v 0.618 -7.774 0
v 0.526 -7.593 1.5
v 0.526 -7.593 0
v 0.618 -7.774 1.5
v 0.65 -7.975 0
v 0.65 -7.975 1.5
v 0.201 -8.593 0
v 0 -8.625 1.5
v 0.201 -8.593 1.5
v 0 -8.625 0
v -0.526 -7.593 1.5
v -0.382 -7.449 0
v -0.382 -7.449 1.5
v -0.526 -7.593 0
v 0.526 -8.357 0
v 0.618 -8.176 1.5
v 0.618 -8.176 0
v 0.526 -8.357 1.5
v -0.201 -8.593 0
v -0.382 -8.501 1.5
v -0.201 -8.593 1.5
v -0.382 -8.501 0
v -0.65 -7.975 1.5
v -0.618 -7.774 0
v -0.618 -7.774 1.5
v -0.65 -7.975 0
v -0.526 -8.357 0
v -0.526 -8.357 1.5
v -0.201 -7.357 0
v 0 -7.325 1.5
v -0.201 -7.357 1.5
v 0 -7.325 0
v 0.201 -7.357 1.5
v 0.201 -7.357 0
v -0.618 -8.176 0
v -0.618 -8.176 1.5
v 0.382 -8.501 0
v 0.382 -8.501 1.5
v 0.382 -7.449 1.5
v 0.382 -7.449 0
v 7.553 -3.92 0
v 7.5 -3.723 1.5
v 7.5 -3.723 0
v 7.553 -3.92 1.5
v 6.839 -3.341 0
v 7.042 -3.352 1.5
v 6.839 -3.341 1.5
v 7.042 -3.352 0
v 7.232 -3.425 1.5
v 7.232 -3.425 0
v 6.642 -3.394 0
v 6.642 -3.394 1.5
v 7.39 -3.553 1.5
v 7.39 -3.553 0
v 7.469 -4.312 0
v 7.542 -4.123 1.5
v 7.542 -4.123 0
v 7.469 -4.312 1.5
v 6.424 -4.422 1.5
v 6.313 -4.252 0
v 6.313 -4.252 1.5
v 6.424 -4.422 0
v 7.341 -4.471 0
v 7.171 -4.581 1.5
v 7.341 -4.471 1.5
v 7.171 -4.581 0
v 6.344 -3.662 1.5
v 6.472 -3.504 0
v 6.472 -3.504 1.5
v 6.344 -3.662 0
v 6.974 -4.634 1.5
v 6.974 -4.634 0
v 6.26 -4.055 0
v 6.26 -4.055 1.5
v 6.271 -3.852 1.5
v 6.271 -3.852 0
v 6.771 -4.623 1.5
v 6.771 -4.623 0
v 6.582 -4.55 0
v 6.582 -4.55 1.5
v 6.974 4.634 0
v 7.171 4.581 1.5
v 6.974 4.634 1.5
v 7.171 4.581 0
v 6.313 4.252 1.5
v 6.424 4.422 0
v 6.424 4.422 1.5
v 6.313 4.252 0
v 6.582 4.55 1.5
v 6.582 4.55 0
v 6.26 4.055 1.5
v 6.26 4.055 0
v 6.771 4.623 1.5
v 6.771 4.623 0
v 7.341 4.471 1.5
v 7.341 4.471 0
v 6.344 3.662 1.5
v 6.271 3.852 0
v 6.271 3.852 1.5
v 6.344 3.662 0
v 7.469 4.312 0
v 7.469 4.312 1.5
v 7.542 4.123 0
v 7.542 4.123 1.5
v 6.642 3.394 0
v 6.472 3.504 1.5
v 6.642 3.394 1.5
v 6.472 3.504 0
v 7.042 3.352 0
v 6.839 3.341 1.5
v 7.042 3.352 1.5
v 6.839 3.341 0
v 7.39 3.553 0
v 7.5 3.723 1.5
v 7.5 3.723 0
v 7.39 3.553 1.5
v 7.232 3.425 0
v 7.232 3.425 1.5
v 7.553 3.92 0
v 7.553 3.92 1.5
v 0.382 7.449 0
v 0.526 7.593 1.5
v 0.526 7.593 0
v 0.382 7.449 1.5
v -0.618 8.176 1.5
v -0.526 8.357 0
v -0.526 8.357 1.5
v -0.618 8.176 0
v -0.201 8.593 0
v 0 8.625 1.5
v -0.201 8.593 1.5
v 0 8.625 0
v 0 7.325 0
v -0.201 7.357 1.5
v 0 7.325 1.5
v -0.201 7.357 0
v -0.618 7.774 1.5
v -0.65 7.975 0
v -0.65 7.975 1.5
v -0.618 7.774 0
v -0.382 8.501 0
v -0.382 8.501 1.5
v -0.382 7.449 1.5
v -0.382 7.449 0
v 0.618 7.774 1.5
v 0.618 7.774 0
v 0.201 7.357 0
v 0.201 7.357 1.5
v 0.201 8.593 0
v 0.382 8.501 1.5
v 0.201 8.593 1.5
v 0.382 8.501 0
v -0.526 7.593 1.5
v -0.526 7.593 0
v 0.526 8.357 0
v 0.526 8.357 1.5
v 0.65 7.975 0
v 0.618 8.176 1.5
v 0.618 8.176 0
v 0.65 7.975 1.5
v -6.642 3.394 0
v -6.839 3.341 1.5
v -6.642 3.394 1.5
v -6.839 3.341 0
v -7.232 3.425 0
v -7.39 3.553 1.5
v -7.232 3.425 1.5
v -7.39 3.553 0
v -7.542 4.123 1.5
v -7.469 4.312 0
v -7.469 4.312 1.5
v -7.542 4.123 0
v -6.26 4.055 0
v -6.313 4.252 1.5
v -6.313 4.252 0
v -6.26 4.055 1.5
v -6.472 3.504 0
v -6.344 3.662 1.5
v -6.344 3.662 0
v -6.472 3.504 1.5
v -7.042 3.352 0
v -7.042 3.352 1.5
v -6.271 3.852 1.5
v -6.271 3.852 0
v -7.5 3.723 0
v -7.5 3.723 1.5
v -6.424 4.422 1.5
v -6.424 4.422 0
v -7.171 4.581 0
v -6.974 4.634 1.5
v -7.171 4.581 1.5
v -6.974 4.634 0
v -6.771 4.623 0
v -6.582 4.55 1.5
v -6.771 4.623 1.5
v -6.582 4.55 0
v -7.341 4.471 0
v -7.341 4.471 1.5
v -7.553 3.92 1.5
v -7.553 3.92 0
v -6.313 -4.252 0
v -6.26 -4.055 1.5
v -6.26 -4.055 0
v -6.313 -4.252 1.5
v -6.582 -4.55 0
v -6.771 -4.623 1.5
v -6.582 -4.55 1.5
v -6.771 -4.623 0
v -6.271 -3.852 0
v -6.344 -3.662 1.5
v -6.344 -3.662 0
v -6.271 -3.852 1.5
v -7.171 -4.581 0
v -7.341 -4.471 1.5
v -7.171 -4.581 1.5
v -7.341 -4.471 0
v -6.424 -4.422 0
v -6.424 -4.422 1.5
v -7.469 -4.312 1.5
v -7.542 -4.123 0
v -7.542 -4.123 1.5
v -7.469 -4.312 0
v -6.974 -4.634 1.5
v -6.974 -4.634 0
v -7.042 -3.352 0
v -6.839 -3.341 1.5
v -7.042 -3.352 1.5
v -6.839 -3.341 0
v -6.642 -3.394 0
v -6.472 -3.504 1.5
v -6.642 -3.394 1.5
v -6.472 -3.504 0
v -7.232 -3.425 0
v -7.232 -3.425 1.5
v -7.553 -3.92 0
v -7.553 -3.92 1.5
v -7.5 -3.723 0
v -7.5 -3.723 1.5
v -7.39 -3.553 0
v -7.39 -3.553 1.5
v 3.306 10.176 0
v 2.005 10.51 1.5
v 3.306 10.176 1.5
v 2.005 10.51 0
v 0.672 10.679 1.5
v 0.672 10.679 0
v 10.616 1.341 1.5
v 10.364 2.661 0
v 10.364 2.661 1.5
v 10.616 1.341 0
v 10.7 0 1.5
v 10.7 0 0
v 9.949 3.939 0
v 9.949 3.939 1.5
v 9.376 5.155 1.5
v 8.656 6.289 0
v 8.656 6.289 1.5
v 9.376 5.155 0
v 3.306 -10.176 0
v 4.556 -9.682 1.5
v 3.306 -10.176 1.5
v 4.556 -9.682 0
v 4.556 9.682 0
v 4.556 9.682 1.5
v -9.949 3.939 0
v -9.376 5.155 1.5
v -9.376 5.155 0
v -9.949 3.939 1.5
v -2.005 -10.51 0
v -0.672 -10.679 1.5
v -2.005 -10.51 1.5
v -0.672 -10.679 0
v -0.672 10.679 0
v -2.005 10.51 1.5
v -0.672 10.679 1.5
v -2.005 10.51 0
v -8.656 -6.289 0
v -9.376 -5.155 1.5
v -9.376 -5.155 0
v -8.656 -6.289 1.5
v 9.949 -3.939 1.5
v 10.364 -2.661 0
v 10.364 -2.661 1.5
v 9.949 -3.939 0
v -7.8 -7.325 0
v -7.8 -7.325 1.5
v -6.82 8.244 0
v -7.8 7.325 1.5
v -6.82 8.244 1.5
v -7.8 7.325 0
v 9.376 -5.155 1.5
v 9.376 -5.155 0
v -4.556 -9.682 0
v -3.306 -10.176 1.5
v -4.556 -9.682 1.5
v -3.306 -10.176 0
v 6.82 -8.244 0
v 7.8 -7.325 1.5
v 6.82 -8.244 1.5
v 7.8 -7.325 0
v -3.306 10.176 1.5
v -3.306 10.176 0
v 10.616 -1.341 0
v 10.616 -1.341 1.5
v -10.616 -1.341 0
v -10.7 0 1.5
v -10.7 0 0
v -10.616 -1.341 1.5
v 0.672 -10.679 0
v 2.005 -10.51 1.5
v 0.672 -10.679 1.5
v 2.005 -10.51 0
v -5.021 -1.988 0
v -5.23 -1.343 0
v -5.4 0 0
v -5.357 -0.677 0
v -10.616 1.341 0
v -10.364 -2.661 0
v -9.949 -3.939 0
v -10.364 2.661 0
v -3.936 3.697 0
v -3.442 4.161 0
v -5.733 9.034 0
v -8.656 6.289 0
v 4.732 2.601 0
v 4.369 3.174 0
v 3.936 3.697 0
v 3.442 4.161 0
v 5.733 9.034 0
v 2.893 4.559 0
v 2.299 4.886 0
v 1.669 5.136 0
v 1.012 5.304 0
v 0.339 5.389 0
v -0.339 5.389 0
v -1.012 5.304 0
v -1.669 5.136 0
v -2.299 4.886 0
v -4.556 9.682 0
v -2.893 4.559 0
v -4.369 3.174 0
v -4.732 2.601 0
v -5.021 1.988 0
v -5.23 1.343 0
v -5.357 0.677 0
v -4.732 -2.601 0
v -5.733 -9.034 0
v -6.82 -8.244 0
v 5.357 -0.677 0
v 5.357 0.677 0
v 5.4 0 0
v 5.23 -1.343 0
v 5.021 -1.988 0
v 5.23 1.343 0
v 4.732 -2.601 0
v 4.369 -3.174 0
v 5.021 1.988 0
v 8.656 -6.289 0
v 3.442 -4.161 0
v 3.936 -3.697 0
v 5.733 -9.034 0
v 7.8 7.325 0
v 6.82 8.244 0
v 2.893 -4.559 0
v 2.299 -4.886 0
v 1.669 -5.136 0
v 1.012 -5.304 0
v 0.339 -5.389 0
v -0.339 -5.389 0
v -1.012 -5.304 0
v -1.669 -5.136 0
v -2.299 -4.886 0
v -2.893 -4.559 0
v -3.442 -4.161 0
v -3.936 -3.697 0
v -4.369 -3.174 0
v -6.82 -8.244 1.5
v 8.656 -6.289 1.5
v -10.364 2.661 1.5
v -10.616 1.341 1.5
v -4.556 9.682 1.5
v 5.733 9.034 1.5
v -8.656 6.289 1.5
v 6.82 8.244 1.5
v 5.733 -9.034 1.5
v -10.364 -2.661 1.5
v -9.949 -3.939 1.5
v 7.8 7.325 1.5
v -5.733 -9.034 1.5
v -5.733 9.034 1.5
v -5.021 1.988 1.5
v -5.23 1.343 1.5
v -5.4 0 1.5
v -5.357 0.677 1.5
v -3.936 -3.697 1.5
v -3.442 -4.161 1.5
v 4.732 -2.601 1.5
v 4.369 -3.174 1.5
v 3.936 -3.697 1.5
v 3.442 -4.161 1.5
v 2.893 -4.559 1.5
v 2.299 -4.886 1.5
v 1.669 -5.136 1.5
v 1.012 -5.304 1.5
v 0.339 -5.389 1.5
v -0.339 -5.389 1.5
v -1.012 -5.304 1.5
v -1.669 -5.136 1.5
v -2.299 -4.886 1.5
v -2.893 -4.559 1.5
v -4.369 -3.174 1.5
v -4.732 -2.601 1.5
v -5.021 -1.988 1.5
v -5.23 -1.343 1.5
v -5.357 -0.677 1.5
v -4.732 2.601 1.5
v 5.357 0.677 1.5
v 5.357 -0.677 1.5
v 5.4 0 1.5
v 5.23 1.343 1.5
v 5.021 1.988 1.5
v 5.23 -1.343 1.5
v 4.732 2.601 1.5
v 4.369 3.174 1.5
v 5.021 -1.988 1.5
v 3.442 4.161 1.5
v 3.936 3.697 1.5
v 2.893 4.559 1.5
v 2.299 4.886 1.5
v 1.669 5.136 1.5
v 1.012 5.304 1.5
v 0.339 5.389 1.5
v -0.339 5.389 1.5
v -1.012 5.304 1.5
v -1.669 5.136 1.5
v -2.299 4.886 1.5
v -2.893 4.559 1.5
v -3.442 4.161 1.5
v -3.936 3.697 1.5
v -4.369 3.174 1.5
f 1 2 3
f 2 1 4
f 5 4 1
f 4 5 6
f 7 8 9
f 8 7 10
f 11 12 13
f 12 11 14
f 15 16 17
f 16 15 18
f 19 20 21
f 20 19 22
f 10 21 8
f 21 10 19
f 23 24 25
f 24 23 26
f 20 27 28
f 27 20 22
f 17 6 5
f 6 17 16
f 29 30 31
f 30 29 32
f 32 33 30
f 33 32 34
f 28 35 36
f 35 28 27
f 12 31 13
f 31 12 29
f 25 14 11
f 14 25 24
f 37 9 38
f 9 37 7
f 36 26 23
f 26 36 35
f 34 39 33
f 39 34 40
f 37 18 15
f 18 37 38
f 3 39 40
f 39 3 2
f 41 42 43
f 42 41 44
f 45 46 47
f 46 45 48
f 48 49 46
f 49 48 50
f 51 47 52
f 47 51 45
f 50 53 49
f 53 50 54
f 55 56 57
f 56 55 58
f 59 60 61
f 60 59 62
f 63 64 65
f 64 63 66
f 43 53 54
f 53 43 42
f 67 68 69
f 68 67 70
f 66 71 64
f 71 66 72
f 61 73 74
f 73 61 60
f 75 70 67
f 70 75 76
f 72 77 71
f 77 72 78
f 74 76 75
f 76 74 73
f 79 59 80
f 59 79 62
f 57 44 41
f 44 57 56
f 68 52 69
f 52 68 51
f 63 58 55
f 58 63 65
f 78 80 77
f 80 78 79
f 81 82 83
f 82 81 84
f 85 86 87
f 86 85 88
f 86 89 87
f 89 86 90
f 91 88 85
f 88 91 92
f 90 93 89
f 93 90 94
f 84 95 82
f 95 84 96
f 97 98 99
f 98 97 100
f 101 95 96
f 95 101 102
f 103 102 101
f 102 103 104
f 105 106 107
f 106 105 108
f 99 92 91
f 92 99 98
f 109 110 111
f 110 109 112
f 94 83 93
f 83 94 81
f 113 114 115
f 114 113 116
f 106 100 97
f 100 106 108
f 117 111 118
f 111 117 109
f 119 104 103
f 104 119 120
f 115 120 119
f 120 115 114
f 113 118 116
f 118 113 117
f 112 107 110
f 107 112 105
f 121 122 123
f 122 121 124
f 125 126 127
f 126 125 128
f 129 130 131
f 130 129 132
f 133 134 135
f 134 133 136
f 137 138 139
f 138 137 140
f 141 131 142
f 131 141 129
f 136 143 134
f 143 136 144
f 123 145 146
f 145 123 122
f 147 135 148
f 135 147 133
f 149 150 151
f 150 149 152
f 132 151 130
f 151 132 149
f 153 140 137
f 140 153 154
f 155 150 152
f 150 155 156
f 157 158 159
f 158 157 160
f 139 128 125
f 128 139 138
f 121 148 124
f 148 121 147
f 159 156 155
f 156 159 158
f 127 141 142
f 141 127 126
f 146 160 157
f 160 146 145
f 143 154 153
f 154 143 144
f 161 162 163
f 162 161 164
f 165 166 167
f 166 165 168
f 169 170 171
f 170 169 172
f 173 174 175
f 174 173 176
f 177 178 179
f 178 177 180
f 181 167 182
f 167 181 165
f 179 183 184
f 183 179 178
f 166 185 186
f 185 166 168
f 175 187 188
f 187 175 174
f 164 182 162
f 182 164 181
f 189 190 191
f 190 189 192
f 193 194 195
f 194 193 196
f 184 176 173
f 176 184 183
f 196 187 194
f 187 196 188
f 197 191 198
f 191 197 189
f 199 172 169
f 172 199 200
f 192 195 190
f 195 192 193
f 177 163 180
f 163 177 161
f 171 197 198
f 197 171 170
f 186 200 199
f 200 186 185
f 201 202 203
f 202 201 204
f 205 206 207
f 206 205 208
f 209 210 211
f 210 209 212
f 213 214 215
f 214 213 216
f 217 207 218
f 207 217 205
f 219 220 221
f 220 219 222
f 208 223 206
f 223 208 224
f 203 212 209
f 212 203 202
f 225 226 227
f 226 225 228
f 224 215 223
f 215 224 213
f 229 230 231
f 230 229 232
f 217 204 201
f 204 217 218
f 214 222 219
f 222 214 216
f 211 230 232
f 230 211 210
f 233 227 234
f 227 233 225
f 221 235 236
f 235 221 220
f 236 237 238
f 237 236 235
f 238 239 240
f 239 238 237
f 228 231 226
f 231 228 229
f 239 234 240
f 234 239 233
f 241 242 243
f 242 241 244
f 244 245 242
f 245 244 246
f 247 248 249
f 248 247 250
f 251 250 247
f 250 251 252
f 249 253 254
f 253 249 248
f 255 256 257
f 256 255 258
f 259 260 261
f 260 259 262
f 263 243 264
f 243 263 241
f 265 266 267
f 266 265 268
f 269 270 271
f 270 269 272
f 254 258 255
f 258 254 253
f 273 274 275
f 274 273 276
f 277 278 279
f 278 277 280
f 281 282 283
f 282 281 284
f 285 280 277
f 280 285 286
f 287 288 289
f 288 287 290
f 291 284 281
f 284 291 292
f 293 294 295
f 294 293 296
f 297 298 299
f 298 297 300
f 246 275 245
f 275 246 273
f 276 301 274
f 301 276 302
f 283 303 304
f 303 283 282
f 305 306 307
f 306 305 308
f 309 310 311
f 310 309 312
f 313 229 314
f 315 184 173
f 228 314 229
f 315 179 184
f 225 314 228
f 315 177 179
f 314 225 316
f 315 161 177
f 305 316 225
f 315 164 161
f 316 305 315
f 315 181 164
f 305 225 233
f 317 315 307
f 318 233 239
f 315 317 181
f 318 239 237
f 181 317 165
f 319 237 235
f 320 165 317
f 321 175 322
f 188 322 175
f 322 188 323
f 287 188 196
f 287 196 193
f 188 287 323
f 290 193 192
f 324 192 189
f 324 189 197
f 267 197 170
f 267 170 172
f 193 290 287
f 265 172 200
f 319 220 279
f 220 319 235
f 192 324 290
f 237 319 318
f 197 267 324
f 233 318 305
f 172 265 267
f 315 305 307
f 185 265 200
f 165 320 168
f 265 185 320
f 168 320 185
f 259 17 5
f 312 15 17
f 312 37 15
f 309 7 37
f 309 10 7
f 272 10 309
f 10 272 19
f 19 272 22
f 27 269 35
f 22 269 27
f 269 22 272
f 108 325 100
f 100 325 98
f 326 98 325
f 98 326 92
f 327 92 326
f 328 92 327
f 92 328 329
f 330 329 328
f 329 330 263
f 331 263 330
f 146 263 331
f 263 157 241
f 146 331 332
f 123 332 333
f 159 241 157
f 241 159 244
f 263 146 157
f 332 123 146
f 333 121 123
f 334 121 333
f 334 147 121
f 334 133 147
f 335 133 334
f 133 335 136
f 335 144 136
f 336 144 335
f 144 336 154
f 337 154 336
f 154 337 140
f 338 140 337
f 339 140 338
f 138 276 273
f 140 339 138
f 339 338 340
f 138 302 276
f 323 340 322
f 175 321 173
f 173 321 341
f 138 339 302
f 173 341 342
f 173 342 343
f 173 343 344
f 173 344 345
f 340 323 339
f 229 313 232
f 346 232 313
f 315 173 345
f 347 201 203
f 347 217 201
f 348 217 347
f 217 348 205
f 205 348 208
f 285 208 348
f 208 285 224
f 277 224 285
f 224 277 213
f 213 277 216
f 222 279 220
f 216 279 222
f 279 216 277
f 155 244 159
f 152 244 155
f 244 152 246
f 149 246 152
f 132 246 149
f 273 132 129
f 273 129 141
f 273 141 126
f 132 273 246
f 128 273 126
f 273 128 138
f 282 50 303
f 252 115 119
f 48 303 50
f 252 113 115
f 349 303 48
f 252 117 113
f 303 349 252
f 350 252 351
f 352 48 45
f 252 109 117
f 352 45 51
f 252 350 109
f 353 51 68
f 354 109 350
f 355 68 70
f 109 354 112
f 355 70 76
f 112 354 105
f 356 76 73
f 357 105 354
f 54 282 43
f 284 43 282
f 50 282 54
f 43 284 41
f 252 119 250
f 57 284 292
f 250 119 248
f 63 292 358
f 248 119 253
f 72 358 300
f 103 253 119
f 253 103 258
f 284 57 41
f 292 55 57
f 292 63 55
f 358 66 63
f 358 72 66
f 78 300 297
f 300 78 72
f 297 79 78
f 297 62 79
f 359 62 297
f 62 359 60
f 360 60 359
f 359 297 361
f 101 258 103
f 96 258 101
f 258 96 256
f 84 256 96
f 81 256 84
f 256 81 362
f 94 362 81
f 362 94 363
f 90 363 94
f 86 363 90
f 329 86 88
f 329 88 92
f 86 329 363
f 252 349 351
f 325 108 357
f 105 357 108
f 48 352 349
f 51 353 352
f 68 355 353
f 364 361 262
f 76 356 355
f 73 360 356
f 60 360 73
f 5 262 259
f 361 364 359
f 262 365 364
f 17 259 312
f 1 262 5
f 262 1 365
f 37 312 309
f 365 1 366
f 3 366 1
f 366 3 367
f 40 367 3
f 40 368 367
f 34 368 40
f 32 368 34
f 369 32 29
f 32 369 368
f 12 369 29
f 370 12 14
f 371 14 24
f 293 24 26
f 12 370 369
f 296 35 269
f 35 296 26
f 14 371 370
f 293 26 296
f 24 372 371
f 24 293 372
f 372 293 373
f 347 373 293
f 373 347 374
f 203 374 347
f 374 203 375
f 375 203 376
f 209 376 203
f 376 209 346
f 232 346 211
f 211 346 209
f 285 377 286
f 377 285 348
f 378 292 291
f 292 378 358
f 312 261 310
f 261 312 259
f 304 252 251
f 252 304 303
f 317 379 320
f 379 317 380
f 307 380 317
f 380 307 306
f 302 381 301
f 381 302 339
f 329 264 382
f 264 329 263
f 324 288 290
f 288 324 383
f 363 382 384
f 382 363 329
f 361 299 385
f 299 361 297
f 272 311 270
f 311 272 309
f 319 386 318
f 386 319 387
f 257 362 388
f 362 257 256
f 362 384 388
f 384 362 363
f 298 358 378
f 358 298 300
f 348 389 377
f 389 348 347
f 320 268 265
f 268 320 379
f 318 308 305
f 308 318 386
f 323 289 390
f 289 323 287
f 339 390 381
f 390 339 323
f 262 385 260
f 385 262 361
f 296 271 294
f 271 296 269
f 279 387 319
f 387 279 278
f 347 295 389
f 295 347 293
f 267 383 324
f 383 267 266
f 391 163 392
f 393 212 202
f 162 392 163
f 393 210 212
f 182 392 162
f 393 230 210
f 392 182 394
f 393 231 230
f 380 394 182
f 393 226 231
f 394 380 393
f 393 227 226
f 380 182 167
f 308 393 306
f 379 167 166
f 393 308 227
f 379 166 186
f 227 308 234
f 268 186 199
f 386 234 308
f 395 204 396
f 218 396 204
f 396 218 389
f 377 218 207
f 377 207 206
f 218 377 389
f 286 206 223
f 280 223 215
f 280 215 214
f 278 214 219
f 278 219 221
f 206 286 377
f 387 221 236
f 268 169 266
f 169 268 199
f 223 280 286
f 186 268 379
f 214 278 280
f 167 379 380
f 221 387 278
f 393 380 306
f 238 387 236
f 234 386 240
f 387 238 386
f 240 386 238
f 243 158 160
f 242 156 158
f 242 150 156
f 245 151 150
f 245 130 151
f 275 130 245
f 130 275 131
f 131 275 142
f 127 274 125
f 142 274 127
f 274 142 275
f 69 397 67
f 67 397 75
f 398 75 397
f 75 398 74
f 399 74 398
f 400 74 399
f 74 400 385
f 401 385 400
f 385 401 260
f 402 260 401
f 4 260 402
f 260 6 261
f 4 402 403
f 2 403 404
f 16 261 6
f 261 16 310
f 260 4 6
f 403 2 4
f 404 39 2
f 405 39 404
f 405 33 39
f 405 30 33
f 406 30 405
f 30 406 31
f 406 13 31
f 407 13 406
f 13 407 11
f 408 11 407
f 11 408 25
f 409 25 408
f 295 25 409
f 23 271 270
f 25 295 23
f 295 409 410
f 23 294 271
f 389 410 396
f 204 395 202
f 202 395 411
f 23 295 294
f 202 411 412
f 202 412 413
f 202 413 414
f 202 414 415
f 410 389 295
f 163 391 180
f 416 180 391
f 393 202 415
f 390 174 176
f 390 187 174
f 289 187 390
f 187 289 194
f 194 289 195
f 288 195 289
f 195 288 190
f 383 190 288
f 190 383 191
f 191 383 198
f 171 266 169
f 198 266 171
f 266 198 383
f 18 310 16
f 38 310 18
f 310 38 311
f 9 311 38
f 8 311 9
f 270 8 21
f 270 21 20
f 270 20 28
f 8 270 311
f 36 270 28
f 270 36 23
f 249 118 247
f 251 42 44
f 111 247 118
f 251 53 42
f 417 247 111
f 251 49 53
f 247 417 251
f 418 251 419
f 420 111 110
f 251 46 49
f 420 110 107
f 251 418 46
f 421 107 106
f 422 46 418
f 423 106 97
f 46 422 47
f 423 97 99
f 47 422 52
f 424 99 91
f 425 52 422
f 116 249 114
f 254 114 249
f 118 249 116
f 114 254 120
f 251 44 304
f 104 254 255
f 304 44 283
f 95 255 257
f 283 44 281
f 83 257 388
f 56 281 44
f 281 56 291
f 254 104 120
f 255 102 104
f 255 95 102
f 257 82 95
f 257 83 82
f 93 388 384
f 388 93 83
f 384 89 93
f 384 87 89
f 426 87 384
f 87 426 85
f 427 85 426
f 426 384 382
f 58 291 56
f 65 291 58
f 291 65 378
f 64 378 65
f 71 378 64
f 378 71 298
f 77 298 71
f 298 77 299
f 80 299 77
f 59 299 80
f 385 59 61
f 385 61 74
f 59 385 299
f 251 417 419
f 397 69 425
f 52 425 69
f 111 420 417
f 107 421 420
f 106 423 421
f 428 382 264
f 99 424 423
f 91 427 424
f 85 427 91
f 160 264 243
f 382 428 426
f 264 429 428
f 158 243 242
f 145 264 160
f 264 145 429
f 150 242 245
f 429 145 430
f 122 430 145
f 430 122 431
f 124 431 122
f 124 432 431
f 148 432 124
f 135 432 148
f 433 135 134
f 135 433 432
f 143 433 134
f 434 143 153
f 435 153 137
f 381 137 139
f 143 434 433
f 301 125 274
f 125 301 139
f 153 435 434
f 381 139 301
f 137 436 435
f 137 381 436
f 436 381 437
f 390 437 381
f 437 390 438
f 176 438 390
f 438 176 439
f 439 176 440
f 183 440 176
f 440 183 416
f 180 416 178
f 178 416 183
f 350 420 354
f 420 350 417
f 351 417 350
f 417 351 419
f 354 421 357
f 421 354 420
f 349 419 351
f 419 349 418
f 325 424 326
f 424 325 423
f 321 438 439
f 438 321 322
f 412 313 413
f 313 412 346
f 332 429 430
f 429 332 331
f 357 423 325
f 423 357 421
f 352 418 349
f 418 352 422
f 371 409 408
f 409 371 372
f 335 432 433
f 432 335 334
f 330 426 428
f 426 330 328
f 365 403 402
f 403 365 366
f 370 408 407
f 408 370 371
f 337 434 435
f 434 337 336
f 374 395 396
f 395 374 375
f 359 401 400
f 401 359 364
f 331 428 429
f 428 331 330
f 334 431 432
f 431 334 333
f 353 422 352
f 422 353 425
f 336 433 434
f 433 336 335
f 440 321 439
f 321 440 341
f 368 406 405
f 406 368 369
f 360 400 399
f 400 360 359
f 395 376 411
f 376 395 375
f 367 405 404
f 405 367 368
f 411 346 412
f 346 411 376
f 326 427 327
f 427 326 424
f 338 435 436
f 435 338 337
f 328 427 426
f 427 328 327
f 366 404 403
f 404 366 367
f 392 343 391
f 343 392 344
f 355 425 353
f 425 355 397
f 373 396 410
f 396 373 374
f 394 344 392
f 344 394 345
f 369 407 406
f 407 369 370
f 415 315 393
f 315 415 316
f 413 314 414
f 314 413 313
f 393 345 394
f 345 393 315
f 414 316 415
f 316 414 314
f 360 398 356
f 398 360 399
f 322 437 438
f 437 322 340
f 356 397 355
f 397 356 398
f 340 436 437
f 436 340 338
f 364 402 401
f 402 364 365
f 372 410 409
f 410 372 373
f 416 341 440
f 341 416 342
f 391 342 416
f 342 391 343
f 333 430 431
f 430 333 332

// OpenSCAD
// file: dimensions.scad
axle_top_diameter = 19.95;
axle_bottom_diameter = 21.4;
axle_top_height = 9.4;
axle_bottom_height = 3 + 5.2 + 4 + 2;
axle_hole_diameter = 13.2;
bottom_plate_height = 3;
rim_diameter = 66;
rim_height = 4.8;
rim_thickness = 1.5;
wheel_screw_diameter = 2;
wheel_thickness = 2;
o_ring_inner_diameter = 106;
o_ring_cross_section_diameter = 6;

bevel_gear_to_cup_fixing_thickness = 1.5;
bottom_bevel_gear_thickness = 4;
bevel_gear_backlash = 0.005;

landing_leg_length = 20;

pneumatic_tube_od = 6;
pneumatic_tube_id = 4;
pneumatic_rotary_joint_od = 13.5;
pneumatic_rotary_joint_depth = 17;
pneumatic_rotary_joint_to_tube_connector_thickness = 1;
pneumatic_rotary_joint_to_tube_connector_cavity = 1;

tool_attachment_distance_from_center = 46;
tool_attachment_height = 15;
tool_attachment_screw_diameter = 2;
tool_attachment_tool_diameter = 8;
tool_attachment_attachment_length = 10;
tool_attachment_hole_length = 20;
tool_attachment_hole_depth = 3;
// main file
include <dimensions.scad>

module bevel_gear_to_cup_fixing() {
    difference() {
        cylinder(h = bevel_gear_to_cup_fixing_thickness, r = axle_bottom_diameter / 2, center = false, $fn = 50);
        for (i = [0:5]) {
            rotate([0, 0, 360 * i / 6]) {
                translate([0, -axle_top_diameter / 2 + 2, -0.01]) {
                    cylinder(h = bevel_gear_to_cup_fixing_thickness + 0.02, r = 1.3 / 2, center = false, $fn = 20);
                }
            }
        }
        translate([0, 0, -0.01]) {
            cylinder(h = bevel_gear_to_cup_fixing_thickness + 0.02, r = axle_bottom_diameter / 2 - 5.3, center = false, $fn = 50);
        }
    }
}

bevel_gear_to_cup_fixing();
